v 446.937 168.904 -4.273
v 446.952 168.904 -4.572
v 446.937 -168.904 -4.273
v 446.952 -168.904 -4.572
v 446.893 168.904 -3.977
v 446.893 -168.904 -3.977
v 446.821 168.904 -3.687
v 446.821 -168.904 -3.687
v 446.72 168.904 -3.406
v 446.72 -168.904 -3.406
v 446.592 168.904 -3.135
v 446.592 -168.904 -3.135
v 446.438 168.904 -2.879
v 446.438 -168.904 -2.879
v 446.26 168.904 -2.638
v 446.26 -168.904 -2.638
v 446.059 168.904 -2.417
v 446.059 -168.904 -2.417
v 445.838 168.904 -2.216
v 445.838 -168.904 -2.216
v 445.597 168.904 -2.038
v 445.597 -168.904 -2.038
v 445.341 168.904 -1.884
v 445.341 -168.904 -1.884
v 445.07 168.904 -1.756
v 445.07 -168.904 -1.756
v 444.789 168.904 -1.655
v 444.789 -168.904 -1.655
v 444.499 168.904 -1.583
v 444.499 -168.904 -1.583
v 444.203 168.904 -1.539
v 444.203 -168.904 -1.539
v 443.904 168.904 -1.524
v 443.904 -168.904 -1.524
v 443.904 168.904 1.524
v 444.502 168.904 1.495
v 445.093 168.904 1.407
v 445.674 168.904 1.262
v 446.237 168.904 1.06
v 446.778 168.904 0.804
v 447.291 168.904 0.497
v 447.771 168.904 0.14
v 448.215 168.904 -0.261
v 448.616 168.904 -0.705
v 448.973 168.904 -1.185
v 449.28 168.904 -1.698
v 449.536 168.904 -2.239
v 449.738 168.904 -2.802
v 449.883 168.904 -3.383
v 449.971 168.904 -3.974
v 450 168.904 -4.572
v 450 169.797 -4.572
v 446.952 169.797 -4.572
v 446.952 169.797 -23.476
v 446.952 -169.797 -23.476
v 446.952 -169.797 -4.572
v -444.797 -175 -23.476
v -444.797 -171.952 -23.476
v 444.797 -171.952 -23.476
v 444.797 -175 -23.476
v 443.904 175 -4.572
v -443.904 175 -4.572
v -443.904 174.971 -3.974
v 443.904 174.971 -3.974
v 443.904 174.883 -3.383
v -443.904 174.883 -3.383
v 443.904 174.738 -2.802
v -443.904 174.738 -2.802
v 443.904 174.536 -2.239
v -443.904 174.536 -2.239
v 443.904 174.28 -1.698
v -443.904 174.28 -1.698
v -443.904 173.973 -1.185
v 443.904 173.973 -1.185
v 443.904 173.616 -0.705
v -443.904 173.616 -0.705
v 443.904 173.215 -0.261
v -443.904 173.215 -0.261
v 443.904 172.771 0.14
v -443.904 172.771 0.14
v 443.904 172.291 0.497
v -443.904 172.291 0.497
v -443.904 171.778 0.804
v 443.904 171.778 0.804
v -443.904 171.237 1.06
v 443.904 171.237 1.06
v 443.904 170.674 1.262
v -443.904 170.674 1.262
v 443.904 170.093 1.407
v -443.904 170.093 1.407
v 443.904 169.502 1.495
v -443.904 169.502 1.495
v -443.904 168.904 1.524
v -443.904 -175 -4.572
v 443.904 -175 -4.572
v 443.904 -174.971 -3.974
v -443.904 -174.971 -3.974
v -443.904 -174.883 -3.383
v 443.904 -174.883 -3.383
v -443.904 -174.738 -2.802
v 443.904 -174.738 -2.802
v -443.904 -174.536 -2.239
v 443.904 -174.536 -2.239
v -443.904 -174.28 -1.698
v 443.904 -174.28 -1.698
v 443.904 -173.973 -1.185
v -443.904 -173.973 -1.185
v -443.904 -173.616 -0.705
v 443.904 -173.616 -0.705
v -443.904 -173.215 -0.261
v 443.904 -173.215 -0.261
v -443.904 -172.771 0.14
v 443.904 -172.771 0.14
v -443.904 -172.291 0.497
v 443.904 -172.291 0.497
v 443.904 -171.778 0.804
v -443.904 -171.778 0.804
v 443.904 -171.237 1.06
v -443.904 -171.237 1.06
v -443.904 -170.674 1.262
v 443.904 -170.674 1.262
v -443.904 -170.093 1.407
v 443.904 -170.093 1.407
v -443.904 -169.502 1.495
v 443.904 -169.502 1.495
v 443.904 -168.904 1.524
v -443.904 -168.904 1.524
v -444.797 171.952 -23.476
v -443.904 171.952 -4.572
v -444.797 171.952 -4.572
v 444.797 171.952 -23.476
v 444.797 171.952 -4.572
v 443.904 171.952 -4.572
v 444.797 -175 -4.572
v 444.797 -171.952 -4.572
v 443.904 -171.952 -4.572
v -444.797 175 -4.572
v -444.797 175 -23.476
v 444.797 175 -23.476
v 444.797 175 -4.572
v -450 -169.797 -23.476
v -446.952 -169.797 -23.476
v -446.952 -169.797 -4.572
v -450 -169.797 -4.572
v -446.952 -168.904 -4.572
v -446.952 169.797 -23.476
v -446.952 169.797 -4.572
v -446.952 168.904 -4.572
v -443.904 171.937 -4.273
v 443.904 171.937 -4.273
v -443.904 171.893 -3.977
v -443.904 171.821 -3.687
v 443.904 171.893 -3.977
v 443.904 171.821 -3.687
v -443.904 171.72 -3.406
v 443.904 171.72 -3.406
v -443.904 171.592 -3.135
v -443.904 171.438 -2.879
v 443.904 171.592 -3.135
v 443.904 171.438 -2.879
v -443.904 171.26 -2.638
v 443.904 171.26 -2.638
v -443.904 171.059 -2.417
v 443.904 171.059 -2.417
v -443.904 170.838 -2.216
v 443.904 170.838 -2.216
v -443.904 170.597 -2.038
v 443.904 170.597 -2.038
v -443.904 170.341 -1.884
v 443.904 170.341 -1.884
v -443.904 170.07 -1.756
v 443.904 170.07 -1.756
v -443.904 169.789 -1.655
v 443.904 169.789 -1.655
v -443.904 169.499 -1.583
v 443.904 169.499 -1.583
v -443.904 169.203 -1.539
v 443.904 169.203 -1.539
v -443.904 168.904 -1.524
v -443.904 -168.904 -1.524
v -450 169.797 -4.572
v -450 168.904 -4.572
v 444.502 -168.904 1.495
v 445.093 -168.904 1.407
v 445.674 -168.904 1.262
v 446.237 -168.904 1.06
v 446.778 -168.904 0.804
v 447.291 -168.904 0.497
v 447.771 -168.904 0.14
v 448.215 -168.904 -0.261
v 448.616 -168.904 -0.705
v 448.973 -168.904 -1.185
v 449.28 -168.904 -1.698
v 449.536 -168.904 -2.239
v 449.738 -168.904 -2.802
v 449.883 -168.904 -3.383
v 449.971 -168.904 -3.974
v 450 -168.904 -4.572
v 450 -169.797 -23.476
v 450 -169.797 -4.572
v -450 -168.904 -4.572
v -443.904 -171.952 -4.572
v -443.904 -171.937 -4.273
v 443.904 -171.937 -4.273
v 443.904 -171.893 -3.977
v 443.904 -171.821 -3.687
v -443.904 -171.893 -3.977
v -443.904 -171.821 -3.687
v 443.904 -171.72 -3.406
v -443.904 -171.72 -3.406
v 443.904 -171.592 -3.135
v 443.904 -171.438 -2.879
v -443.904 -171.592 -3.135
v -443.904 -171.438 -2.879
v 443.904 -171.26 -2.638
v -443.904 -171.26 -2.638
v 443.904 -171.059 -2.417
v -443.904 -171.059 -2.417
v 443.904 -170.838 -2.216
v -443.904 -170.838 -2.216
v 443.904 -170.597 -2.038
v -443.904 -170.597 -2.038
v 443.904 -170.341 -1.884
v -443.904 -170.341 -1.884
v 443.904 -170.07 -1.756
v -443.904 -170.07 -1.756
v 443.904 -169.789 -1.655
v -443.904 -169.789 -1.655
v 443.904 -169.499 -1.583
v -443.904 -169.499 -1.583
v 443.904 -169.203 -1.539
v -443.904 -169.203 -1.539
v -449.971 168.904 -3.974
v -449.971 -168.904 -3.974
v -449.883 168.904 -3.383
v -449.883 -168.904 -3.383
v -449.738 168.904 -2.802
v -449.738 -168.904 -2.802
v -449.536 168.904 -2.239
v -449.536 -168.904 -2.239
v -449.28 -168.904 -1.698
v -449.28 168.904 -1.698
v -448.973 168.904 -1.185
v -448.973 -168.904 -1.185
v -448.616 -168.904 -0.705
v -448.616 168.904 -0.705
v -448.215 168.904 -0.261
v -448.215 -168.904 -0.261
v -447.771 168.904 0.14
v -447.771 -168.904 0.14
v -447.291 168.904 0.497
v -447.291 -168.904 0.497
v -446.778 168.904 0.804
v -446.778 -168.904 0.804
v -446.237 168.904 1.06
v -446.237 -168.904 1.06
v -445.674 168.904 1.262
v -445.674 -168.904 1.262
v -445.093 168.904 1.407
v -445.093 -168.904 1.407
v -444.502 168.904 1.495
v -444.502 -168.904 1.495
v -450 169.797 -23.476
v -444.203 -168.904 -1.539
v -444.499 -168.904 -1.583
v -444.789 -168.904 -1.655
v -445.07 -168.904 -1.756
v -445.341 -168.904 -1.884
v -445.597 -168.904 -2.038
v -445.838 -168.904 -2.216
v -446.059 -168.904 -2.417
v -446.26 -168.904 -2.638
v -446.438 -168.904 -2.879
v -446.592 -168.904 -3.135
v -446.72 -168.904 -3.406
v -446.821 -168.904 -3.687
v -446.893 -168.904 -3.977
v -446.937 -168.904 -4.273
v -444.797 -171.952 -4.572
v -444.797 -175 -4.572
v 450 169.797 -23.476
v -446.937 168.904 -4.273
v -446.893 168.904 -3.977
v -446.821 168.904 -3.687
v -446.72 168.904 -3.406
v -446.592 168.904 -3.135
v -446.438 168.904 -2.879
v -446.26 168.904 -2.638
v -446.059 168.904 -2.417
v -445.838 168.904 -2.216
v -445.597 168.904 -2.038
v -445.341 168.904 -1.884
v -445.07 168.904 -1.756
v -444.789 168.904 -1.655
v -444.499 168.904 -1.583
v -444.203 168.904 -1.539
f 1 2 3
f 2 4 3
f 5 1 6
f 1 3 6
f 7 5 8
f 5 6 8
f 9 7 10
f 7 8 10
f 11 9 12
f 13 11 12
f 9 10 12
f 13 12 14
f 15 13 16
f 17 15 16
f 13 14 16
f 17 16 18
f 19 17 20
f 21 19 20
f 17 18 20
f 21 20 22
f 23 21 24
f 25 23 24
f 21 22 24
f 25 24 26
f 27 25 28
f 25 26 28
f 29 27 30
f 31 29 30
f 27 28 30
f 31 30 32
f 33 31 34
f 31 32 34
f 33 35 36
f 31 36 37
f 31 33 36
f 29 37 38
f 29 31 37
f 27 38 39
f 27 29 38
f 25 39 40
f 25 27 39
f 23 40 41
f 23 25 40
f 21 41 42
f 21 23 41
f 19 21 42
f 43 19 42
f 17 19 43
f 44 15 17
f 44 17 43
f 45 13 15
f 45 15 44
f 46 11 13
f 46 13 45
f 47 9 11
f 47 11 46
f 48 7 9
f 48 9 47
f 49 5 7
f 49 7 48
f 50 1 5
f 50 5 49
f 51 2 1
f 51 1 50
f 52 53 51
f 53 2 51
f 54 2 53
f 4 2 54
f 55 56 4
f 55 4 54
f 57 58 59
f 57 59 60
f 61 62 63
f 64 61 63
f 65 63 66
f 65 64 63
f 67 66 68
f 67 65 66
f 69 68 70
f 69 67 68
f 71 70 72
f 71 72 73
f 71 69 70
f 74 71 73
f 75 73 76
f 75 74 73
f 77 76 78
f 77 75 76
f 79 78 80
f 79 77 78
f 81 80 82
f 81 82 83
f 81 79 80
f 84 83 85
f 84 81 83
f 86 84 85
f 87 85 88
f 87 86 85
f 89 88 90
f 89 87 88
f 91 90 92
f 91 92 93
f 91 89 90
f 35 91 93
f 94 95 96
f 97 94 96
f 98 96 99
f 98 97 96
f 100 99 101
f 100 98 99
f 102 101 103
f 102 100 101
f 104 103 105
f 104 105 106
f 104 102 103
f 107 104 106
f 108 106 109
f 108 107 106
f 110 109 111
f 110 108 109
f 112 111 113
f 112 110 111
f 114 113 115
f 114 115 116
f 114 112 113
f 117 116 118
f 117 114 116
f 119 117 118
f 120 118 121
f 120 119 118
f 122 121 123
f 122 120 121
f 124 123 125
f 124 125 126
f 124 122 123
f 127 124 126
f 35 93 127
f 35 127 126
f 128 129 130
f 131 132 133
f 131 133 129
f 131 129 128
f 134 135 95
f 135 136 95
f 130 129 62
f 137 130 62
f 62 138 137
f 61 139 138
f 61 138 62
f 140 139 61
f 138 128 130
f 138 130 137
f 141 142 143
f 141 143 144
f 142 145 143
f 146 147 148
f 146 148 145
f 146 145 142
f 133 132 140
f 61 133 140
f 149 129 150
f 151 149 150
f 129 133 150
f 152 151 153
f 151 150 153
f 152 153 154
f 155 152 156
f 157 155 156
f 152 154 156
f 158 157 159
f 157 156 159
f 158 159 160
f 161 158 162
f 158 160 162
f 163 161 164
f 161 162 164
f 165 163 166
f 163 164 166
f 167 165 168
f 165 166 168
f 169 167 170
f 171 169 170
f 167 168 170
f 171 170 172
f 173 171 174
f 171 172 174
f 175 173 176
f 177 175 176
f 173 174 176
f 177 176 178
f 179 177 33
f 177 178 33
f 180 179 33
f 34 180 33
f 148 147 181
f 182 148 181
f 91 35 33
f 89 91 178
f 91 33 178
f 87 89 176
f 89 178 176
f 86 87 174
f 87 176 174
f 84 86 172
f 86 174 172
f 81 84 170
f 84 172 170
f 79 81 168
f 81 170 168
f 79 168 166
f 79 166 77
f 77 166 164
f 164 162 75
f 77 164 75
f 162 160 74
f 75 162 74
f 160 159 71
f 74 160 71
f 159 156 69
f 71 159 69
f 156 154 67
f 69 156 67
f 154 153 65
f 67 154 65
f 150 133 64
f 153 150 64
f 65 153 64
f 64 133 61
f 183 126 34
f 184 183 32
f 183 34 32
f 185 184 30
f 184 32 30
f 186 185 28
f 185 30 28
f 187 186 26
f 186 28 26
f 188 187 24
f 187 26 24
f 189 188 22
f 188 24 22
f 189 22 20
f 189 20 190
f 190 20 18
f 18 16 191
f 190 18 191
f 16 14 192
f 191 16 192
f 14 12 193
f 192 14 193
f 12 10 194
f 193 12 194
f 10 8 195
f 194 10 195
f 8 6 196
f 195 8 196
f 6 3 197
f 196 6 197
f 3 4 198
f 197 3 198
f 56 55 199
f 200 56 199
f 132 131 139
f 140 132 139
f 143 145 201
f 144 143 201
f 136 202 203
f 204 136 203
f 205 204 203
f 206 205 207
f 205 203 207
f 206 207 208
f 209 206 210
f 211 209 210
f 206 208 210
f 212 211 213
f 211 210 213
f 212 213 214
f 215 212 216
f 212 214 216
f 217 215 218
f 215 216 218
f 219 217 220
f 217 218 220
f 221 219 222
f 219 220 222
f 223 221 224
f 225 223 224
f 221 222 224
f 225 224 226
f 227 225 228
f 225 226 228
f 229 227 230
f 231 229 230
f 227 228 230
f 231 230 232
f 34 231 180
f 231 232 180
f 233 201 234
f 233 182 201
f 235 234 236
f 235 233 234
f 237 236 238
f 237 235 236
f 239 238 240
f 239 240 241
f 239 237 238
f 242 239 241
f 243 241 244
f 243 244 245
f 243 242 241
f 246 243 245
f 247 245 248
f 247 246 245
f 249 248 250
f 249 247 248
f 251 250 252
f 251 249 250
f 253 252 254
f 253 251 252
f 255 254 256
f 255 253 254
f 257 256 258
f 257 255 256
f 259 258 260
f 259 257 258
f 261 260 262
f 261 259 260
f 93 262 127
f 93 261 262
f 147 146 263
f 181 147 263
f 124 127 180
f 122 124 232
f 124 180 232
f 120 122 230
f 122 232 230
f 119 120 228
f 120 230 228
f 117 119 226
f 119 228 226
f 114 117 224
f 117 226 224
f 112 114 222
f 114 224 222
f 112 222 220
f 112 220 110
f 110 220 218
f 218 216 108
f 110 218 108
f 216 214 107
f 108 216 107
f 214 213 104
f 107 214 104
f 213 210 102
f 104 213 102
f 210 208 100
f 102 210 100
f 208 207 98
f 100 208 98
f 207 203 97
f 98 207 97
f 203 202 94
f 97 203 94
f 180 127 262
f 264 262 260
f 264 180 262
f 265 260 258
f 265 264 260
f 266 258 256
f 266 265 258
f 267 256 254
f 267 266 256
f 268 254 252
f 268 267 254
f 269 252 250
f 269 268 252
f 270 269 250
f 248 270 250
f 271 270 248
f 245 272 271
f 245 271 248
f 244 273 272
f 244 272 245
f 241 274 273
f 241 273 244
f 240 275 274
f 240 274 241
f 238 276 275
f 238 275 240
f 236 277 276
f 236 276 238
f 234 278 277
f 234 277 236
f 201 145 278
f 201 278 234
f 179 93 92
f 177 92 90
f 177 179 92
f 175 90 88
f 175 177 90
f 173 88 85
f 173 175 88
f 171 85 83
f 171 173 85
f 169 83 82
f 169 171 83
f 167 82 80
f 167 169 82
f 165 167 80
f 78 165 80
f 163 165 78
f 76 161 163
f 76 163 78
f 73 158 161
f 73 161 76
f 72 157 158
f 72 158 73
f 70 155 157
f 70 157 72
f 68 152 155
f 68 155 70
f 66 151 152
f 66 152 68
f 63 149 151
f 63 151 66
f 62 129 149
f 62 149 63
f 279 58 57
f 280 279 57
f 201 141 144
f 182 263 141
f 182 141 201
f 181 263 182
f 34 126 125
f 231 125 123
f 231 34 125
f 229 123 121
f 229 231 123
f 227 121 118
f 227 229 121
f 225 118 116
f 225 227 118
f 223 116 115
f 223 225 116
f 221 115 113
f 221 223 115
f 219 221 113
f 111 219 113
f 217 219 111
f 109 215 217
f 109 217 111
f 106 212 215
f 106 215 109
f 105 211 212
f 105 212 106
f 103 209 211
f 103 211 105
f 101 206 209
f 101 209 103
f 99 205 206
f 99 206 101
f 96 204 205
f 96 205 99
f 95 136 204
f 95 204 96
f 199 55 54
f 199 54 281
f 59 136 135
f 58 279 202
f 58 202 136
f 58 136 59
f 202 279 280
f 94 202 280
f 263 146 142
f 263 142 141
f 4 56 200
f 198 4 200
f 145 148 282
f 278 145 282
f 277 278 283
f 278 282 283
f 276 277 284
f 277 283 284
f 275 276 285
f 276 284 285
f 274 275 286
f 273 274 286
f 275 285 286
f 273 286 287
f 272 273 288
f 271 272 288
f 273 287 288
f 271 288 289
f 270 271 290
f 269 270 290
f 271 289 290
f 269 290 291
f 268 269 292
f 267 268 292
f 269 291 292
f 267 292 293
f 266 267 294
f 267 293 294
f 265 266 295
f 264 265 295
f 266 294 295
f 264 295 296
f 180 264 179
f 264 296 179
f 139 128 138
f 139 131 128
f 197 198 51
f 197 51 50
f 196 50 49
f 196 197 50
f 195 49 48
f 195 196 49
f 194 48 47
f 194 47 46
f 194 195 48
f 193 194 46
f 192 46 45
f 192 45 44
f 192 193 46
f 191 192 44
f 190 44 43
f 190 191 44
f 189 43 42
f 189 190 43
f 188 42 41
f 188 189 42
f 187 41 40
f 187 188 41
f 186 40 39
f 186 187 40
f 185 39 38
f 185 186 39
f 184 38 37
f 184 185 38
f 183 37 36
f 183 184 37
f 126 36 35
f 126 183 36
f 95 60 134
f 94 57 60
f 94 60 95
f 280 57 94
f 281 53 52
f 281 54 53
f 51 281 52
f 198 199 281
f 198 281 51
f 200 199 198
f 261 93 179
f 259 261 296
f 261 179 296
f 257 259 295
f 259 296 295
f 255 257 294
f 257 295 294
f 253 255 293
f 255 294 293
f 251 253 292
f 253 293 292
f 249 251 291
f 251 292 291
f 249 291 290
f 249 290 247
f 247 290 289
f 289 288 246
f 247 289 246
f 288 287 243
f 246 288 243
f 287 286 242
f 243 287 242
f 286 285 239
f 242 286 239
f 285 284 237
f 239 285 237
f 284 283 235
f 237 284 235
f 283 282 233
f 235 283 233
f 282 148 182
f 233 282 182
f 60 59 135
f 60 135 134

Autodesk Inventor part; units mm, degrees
ref_plane "YZ Plane" through (0, 0, 0) normal (1, 0, 0) x (0, 1, 0)
ref_plane "XZ Plane" through (0, 0, 0) normal (0, 1, 0) x (-1, 0, 0)
ref_plane "XY Plane" through (0, 0, 0) normal (0, 0, 1) x (1, 0, 0)
sketch "Sketch2" plane through (0, 0, 0) normal (0, 0, 1) x (1, 0, 0)
  line L0 (-450, -175) -> (450, -175)
  line L1 (450, -175) -> (450, 175)
  line L2 (450, 175) -> (-450, 175)
  line L3 (-450, 175) -> (-450, -175)
  line L4 (-450, -175) -> (450, 175) construction
  line L5 (450, -175) -> (-450, 175) construction
  point P0 (0, 0)
  dimension "d0" = 900
  dimension "d1" = 350
extrude "Plate1" add sketch "Sketch2" along normal mid plane 3.048
sketch "Sketch3" plane through (450, 171.952, 1.524) normal (0, 1, 0) x (-1, 0, 0)
  line L0 (900, 0) -> (0, 0)
  line L1 (0, 0) -> (0, -25)
  line L2 (0, -25) -> (900, -25)
  line L3 (900, -25) -> (900, 0)
edge flange "Flange1" height 25 angle 90 thickness 3.048 bend radius 3.048 thickness toward (0, 1, 0) relief tear relief width 3.048 relief depth 1.524 corner gap 3.048 corner form 2 edges at (0, 175, -1.524) (-450, 0, -1.524) (0, -175, -1.524) (450, 0, -1.524) wall of the first edge with corners at (-450, 171.952, 1.524) (450, 171.952, 1.524) (450, 171.952, -23.476) (-450, 171.952, -23.476)
bend "Bend1"
corner "Corner1"
equation "\"d2\" = Thickness"
equation "\"d3\" = BendReliefWidth"
equation "\"d4\" = BendReliefDepth"
equation "\"d5\" = MinimumRemnant"
equation "\"d6\" = TransitionRadius"
equation "\"d9\" = BendRadius"
equation "\"d10\" = CornerReliefSize"
equation "\"d11\" = GapSize"
equation "\"d12\" = JacobiRadiusSize"
equation "\"BendRadius\" = Thickness"
equation "\"BendReliefWidth\" = Thickness"
equation "\"BendReliefDepth\" = 0.5 * Thickness"
equation "\"CornerReliefSize\" = 4 * Thickness"
equation "\"MinimumRemnant\" = 2 * Thickness"
equation "\"TransitionRadius\" = BendRadius"
equation "\"JacobiRadiusSize\" = BendRadius"
equation "\"GapSize\" = Thickness"
equation "\"Space5\" = 0"
equation "\"Space6\" = 0"
equation "\"Space7\" = 0"
equation "\"Thickness\" = 3.048"
properties part number "TapaDown"
